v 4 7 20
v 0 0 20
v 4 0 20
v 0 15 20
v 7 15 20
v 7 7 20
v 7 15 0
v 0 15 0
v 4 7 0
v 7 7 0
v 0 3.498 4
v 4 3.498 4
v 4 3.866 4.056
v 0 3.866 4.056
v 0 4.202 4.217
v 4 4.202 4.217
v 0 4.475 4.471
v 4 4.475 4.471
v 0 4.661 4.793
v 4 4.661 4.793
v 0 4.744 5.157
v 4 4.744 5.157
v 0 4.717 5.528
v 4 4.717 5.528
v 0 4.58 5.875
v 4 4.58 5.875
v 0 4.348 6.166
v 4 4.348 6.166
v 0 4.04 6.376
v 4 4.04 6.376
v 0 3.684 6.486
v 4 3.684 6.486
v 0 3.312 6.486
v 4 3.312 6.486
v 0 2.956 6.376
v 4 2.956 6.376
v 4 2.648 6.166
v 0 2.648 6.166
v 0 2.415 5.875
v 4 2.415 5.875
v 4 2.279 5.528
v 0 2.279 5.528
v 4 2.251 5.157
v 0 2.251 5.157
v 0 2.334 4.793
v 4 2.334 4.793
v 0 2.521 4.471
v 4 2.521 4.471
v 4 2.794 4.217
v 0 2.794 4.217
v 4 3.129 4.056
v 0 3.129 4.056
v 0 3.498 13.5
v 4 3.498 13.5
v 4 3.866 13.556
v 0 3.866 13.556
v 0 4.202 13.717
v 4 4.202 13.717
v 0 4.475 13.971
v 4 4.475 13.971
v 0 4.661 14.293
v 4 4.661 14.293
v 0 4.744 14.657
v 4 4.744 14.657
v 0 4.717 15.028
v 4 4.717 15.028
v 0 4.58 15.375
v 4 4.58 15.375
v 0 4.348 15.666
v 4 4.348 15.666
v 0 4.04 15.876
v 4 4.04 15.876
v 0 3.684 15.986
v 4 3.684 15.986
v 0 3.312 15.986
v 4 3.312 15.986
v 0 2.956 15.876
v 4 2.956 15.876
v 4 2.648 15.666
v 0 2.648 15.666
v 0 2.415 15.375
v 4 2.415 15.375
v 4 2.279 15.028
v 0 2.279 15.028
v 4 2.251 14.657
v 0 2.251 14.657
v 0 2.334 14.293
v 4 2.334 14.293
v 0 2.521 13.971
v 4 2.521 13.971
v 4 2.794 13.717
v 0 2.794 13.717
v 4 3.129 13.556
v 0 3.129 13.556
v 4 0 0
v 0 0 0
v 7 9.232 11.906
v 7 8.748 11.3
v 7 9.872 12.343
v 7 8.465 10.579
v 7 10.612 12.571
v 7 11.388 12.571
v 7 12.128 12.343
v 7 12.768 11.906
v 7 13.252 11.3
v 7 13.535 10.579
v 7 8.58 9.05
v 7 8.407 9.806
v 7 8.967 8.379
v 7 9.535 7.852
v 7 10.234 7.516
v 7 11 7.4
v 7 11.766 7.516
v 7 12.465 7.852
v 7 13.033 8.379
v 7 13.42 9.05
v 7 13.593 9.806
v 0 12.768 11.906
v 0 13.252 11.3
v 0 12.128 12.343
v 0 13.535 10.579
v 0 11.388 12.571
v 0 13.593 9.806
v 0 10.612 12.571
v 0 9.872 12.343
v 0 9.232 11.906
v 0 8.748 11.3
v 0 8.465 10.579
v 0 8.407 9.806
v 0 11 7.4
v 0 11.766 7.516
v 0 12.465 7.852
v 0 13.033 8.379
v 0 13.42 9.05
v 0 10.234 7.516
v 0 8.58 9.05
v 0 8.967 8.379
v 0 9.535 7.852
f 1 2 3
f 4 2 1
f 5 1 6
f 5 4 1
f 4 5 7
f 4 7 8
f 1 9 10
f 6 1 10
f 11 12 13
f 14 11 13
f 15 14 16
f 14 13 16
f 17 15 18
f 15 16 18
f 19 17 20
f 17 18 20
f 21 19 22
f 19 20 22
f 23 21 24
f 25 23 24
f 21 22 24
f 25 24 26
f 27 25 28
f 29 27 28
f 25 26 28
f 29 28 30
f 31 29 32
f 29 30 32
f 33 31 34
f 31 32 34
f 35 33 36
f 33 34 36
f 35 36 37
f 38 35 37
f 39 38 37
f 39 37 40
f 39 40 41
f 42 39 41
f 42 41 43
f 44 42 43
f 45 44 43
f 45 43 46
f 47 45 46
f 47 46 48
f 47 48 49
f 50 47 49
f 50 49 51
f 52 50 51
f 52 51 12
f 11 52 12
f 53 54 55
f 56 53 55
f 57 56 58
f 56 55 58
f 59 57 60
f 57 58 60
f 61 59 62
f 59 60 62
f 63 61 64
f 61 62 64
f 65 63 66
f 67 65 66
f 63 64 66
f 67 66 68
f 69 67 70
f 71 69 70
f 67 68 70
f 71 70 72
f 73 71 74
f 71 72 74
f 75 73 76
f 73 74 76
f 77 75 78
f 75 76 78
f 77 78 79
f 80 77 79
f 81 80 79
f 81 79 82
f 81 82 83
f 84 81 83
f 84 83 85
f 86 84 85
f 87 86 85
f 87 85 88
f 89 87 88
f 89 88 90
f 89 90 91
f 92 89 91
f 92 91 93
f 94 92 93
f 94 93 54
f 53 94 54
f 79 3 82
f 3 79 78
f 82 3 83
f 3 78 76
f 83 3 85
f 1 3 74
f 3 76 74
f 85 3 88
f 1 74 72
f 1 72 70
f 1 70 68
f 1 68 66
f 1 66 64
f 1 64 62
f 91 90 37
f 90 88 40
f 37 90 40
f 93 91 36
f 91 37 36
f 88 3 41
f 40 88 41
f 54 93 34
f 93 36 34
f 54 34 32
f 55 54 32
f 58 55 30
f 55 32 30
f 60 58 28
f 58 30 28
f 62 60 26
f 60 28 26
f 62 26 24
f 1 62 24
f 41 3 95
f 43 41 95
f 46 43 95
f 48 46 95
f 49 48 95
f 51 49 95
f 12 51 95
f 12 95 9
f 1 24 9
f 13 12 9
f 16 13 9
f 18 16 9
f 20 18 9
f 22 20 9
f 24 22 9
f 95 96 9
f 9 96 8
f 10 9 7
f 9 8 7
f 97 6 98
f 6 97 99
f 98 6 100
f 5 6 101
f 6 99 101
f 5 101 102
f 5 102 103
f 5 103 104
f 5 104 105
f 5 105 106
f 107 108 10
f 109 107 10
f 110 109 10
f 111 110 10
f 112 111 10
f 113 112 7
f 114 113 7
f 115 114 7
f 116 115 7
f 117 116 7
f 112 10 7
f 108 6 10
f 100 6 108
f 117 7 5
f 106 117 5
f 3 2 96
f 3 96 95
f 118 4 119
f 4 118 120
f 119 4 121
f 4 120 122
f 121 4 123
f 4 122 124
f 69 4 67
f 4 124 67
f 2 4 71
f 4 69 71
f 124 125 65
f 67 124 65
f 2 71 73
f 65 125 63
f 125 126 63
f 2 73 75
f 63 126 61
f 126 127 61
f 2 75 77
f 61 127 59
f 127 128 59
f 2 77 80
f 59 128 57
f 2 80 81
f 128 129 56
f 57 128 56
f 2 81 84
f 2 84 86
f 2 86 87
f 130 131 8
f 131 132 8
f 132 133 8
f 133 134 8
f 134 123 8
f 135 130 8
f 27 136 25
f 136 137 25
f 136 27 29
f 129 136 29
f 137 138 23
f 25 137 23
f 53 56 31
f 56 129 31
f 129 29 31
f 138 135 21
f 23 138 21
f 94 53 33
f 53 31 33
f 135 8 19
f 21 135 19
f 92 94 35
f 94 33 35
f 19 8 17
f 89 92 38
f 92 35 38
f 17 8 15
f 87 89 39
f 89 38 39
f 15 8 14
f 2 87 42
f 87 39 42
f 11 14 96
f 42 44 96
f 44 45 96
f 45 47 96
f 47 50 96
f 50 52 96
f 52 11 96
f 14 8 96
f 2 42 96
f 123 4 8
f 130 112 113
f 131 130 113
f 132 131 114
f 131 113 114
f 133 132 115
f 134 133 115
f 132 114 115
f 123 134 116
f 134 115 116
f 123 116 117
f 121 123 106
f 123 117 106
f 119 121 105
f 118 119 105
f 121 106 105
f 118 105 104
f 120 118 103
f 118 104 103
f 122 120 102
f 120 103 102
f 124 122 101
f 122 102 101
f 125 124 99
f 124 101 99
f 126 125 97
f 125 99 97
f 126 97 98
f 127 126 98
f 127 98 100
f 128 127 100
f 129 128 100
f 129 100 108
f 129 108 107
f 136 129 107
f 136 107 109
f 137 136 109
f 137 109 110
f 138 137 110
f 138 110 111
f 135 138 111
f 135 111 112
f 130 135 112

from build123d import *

# Parameters (mm, degrees)
BOSS_EXTRUDE1_DEPTH = 20
CUT_EXTRUDE1_REACH  = 9
SKETCH2_R           = 2.6
CUT_EXTRUDE2_REACH  = 6
SKETCH3_R           = 1.25


with BuildPart() as part:
    # Sketch1 → Boss-Extrude1 (new body)
    with BuildSketch(Plane.XY):
        Polygon((7, 15), (0, 15), (0, 0), (4, 0), (4, 7), (7, 7), align=None)
    extrude(amount=BOSS_EXTRUDE1_DEPTH)

    # Sketch2 → Cut-Extrude1 (cut, up to next)
    with BuildSketch(Plane(origin=(7, 0, 0), x_dir=(0, 0, -1), z_dir=(1, 0, 0)), mode=Mode.PRIVATE) as cut_extrude1_sk1:
        with Locations((-10, 11)):
            Circle(SKETCH2_R)
    cut_extrude1_tool1 = extrude(cut_extrude1_sk1.sketch, amount=-CUT_EXTRUDE1_REACH, mode=Mode.PRIVATE) & part.part
    add(cut_extrude1_tool1.solids().sort_by_distance((7, 11, 10))[0], mode=Mode.SUBTRACT)

    # Sketch3 → Cut-Extrude2 (cut, up to next)
    with BuildSketch(Plane(origin=(4, 0, 0), x_dir=(0, 0, -1), z_dir=(1, 0, 0)), mode=Mode.PRIVATE) as cut_extrude2_sk1:
        with Locations((-14.75, 3.497875885)):
            Circle(SKETCH3_R)
    cut_extrude2_tool1 = extrude(cut_extrude2_sk1.sketch, amount=-CUT_EXTRUDE2_REACH, mode=Mode.PRIVATE) & part.part
    add(cut_extrude2_tool1.solids().sort_by_distance((4, 3.497876, 14.75))[0], mode=Mode.SUBTRACT)
    # Sketch3 → Cut-Extrude2 (cut, up to next)
    with BuildSketch(Plane(origin=(4, 0, 0), x_dir=(0, 0, -1), z_dir=(1, 0, 0)), mode=Mode.PRIVATE) as cut_extrude2_sk2:
        with Locations((-5.25, 3.497875885)):
            Circle(SKETCH3_R)
    cut_extrude2_tool2 = extrude(cut_extrude2_sk2.sketch, amount=-CUT_EXTRUDE2_REACH, mode=Mode.PRIVATE) & part.part
    add(cut_extrude2_tool2.solids().sort_by_distance((4, 3.497876, 5.25))[0], mode=Mode.SUBTRACT)


solid = part.part
